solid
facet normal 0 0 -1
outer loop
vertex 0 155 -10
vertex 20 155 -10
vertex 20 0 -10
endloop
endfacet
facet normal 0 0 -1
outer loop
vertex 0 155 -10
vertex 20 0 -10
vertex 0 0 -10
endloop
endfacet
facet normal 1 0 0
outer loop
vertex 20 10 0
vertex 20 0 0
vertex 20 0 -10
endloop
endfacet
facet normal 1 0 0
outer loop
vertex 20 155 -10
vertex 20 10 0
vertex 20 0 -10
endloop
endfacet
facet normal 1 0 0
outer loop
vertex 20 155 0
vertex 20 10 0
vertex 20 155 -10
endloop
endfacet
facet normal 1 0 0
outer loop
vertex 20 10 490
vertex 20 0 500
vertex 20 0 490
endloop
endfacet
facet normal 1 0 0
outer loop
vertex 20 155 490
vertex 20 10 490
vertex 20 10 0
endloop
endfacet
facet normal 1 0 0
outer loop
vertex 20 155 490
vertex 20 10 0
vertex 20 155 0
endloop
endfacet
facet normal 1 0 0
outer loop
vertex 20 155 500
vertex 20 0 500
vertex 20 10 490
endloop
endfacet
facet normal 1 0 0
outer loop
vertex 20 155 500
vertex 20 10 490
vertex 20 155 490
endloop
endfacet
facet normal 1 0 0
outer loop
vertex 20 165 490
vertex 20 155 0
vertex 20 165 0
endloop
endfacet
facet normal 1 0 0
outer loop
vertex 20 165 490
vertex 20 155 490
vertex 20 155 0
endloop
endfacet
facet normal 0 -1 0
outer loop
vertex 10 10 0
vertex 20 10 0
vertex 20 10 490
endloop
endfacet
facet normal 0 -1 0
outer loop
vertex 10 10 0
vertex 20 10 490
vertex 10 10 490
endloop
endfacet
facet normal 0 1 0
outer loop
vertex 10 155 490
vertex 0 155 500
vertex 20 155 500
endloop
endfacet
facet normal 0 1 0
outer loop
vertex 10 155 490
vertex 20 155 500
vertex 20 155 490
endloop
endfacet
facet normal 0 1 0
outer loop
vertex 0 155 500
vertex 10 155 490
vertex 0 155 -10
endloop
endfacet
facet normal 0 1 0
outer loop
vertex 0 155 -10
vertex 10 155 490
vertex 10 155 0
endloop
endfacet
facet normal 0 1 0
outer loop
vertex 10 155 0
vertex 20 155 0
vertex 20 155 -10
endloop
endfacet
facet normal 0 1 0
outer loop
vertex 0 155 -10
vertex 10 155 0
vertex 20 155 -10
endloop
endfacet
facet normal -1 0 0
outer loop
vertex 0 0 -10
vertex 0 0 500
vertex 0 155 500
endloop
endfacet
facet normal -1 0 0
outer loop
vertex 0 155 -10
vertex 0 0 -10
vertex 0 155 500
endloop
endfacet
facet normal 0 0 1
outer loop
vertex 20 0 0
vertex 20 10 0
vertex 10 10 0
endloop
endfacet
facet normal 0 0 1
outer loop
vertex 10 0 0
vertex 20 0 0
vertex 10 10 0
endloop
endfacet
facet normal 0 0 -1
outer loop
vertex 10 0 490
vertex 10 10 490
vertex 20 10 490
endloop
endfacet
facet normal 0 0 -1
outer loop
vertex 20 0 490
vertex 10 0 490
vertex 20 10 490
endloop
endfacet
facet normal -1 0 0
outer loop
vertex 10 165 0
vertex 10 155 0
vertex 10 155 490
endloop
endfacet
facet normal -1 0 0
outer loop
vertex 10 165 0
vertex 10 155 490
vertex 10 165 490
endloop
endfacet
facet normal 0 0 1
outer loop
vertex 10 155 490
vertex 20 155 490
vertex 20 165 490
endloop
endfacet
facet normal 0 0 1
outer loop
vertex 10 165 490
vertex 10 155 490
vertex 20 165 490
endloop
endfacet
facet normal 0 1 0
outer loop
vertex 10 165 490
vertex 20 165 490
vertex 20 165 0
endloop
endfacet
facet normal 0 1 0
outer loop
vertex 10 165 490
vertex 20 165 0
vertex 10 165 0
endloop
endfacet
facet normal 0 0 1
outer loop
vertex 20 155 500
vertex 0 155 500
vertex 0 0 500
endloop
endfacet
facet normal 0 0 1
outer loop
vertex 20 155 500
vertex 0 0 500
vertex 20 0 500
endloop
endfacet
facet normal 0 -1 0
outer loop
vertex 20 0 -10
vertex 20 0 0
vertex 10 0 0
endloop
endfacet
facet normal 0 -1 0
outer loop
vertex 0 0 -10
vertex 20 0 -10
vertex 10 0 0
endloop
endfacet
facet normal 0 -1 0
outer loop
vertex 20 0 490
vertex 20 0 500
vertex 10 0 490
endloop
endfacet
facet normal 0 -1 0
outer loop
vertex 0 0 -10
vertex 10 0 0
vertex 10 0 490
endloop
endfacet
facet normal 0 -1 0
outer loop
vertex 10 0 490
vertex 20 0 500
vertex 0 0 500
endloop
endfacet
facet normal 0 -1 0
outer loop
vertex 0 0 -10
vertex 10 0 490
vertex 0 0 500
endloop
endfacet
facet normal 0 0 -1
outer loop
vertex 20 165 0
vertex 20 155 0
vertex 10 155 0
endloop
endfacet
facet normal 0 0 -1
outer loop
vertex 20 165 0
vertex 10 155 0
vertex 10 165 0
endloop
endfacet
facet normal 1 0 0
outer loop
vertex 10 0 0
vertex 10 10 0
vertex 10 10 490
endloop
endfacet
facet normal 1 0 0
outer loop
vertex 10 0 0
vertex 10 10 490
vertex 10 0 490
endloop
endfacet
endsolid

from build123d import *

# Parameters (mm, degrees)
EXTRUDE_1_DEPTH     = 490
SKETCH_2_W          = 20
SKETCH_2_H          = 165
EXTRUDE_2_DEPTH     = 10
SKETCH_3_W          = 20
SKETCH_3_H          = 165
EXTRUDE_3_DEPTH     = 10
SKETCH_4_W          = 10
SKETCH_4_H          = 10
CUT_EXTRUDE_1_DEPTH = 527.901319034


with BuildPart() as part:
    # Эскиз1 → Бобышка-Вытянуть1 (new body)
    with BuildSketch(Plane.XY):
        Polygon((0, 0), (0, 155), (10, 155), (10, 165), (20, 165), (20, 10), (10, 10), (10, 0), align=None)
    extrude(amount=EXTRUDE_1_DEPTH)

    # Эскиз2 → Бобышка-Вытянуть2 (add)
    with BuildSketch(Plane.XY.offset(490)):
        with Locations((10, 82.5)):
            Rectangle(SKETCH_2_W, SKETCH_2_H)
    extrude(amount=EXTRUDE_2_DEPTH)

    # Эскиз3 → Бобышка-Вытянуть3 (add)
    with BuildSketch(Plane(origin=(0, 0, 0), x_dir=(-1, 0, 0), z_dir=(0, 0, -1))):
        with Locations((-10, 82.5)):
            Rectangle(SKETCH_3_W, SKETCH_3_H)
    extrude(amount=EXTRUDE_3_DEPTH)

    # Эскиз4 → Вырез-Вытянуть1 (cut, through all)
    with BuildSketch(Plane(origin=(20, 0, 0), x_dir=(0, 0, -1), z_dir=(1, 0, 0))):
        with Locations((-495, 160)):
            Rectangle(SKETCH_4_W, SKETCH_4_H)
        with Locations((5, 160)):
            Rectangle(SKETCH_4_W, SKETCH_4_H)
    extrude(amount=-CUT_EXTRUDE_1_DEPTH, mode=Mode.SUBTRACT)


solid = part.part
